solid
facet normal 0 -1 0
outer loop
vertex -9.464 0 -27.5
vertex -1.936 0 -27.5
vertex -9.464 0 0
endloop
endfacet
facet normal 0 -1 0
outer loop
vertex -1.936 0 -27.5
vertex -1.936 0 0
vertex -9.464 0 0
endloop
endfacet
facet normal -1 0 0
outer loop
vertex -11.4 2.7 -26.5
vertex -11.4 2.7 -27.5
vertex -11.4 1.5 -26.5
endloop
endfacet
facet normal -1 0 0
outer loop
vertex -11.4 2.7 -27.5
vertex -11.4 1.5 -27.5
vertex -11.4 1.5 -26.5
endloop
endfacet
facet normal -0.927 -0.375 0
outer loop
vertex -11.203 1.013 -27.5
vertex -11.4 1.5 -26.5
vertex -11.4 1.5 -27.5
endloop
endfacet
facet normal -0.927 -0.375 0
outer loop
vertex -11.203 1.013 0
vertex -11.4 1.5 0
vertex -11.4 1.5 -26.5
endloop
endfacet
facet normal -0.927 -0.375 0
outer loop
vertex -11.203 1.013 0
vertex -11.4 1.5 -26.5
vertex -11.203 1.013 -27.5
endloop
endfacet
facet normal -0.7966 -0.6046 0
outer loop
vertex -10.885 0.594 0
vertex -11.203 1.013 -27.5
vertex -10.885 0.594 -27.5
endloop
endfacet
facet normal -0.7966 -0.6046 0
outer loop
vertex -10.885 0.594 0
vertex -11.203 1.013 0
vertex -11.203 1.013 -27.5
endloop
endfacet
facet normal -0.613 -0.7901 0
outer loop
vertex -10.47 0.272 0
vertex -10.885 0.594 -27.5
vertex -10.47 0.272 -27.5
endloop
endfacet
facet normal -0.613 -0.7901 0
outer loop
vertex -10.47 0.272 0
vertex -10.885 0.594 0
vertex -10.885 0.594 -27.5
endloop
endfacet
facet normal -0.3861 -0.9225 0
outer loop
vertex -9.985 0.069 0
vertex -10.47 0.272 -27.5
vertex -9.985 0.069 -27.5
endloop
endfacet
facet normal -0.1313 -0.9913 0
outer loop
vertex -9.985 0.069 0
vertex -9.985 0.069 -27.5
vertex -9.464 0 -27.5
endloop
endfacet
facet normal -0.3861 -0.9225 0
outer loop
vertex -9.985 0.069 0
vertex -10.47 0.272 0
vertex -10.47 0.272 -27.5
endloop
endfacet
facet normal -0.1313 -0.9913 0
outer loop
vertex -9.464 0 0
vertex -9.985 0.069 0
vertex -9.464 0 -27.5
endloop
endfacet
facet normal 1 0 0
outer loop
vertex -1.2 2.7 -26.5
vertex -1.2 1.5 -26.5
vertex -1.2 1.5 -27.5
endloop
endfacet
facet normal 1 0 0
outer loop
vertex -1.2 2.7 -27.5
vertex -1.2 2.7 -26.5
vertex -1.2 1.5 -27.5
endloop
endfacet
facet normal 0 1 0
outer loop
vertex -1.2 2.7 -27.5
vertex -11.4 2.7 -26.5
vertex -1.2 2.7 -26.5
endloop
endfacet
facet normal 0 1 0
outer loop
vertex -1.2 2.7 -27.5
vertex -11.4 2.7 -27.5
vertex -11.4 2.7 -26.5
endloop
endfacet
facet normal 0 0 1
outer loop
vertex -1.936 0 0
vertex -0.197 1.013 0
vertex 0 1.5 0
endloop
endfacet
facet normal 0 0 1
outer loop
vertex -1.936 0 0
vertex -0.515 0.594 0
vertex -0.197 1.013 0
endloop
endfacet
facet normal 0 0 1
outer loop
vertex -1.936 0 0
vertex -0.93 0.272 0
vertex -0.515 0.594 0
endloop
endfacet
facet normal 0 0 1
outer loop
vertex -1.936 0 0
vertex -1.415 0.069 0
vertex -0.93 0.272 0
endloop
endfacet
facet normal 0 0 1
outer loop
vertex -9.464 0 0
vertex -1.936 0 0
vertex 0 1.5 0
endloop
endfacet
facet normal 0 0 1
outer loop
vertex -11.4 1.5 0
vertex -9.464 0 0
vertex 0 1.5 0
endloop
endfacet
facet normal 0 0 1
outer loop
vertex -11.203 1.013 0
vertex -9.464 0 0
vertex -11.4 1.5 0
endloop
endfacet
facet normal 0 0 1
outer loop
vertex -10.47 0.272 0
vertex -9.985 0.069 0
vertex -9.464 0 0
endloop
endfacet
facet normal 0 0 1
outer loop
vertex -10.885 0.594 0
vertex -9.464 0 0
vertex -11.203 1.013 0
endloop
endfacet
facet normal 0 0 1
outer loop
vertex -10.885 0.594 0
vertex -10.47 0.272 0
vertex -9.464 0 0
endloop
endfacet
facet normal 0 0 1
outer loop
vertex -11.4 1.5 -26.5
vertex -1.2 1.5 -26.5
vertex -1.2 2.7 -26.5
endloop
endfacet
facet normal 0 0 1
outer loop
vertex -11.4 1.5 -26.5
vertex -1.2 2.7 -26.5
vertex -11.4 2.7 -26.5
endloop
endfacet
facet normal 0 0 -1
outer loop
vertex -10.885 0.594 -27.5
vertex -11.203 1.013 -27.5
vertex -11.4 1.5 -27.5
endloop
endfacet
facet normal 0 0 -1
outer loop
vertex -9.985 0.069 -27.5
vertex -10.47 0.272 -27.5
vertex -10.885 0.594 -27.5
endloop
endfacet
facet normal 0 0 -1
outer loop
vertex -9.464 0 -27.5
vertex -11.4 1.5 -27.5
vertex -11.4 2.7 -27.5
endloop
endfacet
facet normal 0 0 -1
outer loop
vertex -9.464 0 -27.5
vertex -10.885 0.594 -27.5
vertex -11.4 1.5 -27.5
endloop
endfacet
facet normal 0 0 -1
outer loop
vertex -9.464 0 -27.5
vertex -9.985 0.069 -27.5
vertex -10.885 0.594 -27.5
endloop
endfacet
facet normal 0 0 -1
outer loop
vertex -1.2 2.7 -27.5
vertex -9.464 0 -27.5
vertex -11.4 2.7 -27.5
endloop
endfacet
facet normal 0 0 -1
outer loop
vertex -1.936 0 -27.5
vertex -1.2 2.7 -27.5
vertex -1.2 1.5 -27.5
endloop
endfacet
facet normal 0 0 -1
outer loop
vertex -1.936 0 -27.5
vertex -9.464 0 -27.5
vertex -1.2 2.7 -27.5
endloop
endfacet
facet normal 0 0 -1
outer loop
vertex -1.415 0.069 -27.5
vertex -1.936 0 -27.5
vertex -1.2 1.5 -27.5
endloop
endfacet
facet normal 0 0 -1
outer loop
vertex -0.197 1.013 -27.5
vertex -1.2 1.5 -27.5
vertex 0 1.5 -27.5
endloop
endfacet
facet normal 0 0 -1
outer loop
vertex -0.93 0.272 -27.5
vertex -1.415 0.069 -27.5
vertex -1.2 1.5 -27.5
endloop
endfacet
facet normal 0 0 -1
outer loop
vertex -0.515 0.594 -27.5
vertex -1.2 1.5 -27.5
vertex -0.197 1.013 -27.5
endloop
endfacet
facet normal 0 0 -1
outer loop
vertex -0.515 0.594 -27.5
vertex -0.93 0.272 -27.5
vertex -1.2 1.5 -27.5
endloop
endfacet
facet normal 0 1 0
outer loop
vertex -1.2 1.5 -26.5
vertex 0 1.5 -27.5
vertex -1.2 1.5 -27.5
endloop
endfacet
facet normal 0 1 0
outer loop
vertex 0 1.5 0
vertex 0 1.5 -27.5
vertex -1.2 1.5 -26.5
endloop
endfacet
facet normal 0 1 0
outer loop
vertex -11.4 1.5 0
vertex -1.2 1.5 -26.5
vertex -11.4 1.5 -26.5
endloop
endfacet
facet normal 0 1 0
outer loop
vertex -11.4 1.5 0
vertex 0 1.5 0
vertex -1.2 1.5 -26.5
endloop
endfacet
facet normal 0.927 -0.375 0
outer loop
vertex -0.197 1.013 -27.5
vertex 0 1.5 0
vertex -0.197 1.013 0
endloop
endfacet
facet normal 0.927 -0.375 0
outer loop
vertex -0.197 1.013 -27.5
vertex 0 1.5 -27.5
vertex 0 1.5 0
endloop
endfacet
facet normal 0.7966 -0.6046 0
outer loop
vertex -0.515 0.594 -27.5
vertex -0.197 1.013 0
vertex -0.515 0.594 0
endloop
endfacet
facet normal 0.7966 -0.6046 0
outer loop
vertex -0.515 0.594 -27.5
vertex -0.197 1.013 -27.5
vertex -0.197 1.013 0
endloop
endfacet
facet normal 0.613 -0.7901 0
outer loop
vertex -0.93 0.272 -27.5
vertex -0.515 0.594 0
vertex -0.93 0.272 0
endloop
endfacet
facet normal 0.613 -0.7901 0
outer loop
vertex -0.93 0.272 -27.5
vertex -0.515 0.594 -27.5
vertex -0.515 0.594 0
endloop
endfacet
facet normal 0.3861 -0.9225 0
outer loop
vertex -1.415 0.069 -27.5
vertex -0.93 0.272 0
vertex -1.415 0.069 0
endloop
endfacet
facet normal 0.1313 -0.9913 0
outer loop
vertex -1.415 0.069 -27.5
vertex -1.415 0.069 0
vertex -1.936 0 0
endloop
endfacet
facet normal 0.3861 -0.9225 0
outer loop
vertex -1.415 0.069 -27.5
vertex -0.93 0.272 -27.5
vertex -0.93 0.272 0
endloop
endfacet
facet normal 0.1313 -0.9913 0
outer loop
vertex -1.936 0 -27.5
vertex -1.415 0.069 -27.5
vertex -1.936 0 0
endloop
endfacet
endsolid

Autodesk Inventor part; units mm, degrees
ref_plane "YZ Plane" through (0, 0, 0) normal (1, 0, 0) x (0, 1, 0)
ref_plane "XZ Plane" through (0, 0, 0) normal (0, 1, 0) x (-1, 0, 0)
ref_plane "XY Plane" through (0, 0, 0) normal (0, 0, 1) x (1, 0, 0)
sketch "스케치1" plane through (0, 0, 0) normal (0, 1, 0) x (-1, 0, 0)
  line L0 (0, 0) -> (11.4, 0)
  line L1 (11.4, 0) -> (11.4, -27.5)
  line L2 (11.4, -27.5) -> (0, -27.5)
  line L3 (0, -27.5) -> (0, 0)
  dimension "d0" = 11.4
  dimension "d1" = 27.5
extrude "돌출1" add sketch "스케치1" along normal blind 1.5
fillet "모깎기1" radius 2 2 edges at (-11.4, 0, -13.75) (0, 0, -13.75)
sketch "스케치4" plane through (0, 1.5, 0) normal (0, 1, 0) x (1, 0, 0)
  line L0 (-11.4, 27.5) -> (-11.4, 0) projected
  line L1 (0, 0) -> (0, 27.5) projected
  line L2 (0, 27.5) -> (-11.4, 27.5) projected
  line L3 (-11.4, 27.5) -> (0, 27.5)
  line L4 (0, 27.5) -> (0, 26.5)
  line L5 (0, 26.5) -> (-11.4, 26.5)
  line L6 (-11.4, 26.5) -> (-11.4, 27.5)
  line L7 (-1.2, 26.5) -> (-1.2, 27.5)
  dimension "d18" = 1
  dimension "d21" = 1.2
extrude "돌출4" add sketch "스케치4" along normal blind 1.2 contours L2 L7 L5 L0
properties part number "_3D 인쇄"
